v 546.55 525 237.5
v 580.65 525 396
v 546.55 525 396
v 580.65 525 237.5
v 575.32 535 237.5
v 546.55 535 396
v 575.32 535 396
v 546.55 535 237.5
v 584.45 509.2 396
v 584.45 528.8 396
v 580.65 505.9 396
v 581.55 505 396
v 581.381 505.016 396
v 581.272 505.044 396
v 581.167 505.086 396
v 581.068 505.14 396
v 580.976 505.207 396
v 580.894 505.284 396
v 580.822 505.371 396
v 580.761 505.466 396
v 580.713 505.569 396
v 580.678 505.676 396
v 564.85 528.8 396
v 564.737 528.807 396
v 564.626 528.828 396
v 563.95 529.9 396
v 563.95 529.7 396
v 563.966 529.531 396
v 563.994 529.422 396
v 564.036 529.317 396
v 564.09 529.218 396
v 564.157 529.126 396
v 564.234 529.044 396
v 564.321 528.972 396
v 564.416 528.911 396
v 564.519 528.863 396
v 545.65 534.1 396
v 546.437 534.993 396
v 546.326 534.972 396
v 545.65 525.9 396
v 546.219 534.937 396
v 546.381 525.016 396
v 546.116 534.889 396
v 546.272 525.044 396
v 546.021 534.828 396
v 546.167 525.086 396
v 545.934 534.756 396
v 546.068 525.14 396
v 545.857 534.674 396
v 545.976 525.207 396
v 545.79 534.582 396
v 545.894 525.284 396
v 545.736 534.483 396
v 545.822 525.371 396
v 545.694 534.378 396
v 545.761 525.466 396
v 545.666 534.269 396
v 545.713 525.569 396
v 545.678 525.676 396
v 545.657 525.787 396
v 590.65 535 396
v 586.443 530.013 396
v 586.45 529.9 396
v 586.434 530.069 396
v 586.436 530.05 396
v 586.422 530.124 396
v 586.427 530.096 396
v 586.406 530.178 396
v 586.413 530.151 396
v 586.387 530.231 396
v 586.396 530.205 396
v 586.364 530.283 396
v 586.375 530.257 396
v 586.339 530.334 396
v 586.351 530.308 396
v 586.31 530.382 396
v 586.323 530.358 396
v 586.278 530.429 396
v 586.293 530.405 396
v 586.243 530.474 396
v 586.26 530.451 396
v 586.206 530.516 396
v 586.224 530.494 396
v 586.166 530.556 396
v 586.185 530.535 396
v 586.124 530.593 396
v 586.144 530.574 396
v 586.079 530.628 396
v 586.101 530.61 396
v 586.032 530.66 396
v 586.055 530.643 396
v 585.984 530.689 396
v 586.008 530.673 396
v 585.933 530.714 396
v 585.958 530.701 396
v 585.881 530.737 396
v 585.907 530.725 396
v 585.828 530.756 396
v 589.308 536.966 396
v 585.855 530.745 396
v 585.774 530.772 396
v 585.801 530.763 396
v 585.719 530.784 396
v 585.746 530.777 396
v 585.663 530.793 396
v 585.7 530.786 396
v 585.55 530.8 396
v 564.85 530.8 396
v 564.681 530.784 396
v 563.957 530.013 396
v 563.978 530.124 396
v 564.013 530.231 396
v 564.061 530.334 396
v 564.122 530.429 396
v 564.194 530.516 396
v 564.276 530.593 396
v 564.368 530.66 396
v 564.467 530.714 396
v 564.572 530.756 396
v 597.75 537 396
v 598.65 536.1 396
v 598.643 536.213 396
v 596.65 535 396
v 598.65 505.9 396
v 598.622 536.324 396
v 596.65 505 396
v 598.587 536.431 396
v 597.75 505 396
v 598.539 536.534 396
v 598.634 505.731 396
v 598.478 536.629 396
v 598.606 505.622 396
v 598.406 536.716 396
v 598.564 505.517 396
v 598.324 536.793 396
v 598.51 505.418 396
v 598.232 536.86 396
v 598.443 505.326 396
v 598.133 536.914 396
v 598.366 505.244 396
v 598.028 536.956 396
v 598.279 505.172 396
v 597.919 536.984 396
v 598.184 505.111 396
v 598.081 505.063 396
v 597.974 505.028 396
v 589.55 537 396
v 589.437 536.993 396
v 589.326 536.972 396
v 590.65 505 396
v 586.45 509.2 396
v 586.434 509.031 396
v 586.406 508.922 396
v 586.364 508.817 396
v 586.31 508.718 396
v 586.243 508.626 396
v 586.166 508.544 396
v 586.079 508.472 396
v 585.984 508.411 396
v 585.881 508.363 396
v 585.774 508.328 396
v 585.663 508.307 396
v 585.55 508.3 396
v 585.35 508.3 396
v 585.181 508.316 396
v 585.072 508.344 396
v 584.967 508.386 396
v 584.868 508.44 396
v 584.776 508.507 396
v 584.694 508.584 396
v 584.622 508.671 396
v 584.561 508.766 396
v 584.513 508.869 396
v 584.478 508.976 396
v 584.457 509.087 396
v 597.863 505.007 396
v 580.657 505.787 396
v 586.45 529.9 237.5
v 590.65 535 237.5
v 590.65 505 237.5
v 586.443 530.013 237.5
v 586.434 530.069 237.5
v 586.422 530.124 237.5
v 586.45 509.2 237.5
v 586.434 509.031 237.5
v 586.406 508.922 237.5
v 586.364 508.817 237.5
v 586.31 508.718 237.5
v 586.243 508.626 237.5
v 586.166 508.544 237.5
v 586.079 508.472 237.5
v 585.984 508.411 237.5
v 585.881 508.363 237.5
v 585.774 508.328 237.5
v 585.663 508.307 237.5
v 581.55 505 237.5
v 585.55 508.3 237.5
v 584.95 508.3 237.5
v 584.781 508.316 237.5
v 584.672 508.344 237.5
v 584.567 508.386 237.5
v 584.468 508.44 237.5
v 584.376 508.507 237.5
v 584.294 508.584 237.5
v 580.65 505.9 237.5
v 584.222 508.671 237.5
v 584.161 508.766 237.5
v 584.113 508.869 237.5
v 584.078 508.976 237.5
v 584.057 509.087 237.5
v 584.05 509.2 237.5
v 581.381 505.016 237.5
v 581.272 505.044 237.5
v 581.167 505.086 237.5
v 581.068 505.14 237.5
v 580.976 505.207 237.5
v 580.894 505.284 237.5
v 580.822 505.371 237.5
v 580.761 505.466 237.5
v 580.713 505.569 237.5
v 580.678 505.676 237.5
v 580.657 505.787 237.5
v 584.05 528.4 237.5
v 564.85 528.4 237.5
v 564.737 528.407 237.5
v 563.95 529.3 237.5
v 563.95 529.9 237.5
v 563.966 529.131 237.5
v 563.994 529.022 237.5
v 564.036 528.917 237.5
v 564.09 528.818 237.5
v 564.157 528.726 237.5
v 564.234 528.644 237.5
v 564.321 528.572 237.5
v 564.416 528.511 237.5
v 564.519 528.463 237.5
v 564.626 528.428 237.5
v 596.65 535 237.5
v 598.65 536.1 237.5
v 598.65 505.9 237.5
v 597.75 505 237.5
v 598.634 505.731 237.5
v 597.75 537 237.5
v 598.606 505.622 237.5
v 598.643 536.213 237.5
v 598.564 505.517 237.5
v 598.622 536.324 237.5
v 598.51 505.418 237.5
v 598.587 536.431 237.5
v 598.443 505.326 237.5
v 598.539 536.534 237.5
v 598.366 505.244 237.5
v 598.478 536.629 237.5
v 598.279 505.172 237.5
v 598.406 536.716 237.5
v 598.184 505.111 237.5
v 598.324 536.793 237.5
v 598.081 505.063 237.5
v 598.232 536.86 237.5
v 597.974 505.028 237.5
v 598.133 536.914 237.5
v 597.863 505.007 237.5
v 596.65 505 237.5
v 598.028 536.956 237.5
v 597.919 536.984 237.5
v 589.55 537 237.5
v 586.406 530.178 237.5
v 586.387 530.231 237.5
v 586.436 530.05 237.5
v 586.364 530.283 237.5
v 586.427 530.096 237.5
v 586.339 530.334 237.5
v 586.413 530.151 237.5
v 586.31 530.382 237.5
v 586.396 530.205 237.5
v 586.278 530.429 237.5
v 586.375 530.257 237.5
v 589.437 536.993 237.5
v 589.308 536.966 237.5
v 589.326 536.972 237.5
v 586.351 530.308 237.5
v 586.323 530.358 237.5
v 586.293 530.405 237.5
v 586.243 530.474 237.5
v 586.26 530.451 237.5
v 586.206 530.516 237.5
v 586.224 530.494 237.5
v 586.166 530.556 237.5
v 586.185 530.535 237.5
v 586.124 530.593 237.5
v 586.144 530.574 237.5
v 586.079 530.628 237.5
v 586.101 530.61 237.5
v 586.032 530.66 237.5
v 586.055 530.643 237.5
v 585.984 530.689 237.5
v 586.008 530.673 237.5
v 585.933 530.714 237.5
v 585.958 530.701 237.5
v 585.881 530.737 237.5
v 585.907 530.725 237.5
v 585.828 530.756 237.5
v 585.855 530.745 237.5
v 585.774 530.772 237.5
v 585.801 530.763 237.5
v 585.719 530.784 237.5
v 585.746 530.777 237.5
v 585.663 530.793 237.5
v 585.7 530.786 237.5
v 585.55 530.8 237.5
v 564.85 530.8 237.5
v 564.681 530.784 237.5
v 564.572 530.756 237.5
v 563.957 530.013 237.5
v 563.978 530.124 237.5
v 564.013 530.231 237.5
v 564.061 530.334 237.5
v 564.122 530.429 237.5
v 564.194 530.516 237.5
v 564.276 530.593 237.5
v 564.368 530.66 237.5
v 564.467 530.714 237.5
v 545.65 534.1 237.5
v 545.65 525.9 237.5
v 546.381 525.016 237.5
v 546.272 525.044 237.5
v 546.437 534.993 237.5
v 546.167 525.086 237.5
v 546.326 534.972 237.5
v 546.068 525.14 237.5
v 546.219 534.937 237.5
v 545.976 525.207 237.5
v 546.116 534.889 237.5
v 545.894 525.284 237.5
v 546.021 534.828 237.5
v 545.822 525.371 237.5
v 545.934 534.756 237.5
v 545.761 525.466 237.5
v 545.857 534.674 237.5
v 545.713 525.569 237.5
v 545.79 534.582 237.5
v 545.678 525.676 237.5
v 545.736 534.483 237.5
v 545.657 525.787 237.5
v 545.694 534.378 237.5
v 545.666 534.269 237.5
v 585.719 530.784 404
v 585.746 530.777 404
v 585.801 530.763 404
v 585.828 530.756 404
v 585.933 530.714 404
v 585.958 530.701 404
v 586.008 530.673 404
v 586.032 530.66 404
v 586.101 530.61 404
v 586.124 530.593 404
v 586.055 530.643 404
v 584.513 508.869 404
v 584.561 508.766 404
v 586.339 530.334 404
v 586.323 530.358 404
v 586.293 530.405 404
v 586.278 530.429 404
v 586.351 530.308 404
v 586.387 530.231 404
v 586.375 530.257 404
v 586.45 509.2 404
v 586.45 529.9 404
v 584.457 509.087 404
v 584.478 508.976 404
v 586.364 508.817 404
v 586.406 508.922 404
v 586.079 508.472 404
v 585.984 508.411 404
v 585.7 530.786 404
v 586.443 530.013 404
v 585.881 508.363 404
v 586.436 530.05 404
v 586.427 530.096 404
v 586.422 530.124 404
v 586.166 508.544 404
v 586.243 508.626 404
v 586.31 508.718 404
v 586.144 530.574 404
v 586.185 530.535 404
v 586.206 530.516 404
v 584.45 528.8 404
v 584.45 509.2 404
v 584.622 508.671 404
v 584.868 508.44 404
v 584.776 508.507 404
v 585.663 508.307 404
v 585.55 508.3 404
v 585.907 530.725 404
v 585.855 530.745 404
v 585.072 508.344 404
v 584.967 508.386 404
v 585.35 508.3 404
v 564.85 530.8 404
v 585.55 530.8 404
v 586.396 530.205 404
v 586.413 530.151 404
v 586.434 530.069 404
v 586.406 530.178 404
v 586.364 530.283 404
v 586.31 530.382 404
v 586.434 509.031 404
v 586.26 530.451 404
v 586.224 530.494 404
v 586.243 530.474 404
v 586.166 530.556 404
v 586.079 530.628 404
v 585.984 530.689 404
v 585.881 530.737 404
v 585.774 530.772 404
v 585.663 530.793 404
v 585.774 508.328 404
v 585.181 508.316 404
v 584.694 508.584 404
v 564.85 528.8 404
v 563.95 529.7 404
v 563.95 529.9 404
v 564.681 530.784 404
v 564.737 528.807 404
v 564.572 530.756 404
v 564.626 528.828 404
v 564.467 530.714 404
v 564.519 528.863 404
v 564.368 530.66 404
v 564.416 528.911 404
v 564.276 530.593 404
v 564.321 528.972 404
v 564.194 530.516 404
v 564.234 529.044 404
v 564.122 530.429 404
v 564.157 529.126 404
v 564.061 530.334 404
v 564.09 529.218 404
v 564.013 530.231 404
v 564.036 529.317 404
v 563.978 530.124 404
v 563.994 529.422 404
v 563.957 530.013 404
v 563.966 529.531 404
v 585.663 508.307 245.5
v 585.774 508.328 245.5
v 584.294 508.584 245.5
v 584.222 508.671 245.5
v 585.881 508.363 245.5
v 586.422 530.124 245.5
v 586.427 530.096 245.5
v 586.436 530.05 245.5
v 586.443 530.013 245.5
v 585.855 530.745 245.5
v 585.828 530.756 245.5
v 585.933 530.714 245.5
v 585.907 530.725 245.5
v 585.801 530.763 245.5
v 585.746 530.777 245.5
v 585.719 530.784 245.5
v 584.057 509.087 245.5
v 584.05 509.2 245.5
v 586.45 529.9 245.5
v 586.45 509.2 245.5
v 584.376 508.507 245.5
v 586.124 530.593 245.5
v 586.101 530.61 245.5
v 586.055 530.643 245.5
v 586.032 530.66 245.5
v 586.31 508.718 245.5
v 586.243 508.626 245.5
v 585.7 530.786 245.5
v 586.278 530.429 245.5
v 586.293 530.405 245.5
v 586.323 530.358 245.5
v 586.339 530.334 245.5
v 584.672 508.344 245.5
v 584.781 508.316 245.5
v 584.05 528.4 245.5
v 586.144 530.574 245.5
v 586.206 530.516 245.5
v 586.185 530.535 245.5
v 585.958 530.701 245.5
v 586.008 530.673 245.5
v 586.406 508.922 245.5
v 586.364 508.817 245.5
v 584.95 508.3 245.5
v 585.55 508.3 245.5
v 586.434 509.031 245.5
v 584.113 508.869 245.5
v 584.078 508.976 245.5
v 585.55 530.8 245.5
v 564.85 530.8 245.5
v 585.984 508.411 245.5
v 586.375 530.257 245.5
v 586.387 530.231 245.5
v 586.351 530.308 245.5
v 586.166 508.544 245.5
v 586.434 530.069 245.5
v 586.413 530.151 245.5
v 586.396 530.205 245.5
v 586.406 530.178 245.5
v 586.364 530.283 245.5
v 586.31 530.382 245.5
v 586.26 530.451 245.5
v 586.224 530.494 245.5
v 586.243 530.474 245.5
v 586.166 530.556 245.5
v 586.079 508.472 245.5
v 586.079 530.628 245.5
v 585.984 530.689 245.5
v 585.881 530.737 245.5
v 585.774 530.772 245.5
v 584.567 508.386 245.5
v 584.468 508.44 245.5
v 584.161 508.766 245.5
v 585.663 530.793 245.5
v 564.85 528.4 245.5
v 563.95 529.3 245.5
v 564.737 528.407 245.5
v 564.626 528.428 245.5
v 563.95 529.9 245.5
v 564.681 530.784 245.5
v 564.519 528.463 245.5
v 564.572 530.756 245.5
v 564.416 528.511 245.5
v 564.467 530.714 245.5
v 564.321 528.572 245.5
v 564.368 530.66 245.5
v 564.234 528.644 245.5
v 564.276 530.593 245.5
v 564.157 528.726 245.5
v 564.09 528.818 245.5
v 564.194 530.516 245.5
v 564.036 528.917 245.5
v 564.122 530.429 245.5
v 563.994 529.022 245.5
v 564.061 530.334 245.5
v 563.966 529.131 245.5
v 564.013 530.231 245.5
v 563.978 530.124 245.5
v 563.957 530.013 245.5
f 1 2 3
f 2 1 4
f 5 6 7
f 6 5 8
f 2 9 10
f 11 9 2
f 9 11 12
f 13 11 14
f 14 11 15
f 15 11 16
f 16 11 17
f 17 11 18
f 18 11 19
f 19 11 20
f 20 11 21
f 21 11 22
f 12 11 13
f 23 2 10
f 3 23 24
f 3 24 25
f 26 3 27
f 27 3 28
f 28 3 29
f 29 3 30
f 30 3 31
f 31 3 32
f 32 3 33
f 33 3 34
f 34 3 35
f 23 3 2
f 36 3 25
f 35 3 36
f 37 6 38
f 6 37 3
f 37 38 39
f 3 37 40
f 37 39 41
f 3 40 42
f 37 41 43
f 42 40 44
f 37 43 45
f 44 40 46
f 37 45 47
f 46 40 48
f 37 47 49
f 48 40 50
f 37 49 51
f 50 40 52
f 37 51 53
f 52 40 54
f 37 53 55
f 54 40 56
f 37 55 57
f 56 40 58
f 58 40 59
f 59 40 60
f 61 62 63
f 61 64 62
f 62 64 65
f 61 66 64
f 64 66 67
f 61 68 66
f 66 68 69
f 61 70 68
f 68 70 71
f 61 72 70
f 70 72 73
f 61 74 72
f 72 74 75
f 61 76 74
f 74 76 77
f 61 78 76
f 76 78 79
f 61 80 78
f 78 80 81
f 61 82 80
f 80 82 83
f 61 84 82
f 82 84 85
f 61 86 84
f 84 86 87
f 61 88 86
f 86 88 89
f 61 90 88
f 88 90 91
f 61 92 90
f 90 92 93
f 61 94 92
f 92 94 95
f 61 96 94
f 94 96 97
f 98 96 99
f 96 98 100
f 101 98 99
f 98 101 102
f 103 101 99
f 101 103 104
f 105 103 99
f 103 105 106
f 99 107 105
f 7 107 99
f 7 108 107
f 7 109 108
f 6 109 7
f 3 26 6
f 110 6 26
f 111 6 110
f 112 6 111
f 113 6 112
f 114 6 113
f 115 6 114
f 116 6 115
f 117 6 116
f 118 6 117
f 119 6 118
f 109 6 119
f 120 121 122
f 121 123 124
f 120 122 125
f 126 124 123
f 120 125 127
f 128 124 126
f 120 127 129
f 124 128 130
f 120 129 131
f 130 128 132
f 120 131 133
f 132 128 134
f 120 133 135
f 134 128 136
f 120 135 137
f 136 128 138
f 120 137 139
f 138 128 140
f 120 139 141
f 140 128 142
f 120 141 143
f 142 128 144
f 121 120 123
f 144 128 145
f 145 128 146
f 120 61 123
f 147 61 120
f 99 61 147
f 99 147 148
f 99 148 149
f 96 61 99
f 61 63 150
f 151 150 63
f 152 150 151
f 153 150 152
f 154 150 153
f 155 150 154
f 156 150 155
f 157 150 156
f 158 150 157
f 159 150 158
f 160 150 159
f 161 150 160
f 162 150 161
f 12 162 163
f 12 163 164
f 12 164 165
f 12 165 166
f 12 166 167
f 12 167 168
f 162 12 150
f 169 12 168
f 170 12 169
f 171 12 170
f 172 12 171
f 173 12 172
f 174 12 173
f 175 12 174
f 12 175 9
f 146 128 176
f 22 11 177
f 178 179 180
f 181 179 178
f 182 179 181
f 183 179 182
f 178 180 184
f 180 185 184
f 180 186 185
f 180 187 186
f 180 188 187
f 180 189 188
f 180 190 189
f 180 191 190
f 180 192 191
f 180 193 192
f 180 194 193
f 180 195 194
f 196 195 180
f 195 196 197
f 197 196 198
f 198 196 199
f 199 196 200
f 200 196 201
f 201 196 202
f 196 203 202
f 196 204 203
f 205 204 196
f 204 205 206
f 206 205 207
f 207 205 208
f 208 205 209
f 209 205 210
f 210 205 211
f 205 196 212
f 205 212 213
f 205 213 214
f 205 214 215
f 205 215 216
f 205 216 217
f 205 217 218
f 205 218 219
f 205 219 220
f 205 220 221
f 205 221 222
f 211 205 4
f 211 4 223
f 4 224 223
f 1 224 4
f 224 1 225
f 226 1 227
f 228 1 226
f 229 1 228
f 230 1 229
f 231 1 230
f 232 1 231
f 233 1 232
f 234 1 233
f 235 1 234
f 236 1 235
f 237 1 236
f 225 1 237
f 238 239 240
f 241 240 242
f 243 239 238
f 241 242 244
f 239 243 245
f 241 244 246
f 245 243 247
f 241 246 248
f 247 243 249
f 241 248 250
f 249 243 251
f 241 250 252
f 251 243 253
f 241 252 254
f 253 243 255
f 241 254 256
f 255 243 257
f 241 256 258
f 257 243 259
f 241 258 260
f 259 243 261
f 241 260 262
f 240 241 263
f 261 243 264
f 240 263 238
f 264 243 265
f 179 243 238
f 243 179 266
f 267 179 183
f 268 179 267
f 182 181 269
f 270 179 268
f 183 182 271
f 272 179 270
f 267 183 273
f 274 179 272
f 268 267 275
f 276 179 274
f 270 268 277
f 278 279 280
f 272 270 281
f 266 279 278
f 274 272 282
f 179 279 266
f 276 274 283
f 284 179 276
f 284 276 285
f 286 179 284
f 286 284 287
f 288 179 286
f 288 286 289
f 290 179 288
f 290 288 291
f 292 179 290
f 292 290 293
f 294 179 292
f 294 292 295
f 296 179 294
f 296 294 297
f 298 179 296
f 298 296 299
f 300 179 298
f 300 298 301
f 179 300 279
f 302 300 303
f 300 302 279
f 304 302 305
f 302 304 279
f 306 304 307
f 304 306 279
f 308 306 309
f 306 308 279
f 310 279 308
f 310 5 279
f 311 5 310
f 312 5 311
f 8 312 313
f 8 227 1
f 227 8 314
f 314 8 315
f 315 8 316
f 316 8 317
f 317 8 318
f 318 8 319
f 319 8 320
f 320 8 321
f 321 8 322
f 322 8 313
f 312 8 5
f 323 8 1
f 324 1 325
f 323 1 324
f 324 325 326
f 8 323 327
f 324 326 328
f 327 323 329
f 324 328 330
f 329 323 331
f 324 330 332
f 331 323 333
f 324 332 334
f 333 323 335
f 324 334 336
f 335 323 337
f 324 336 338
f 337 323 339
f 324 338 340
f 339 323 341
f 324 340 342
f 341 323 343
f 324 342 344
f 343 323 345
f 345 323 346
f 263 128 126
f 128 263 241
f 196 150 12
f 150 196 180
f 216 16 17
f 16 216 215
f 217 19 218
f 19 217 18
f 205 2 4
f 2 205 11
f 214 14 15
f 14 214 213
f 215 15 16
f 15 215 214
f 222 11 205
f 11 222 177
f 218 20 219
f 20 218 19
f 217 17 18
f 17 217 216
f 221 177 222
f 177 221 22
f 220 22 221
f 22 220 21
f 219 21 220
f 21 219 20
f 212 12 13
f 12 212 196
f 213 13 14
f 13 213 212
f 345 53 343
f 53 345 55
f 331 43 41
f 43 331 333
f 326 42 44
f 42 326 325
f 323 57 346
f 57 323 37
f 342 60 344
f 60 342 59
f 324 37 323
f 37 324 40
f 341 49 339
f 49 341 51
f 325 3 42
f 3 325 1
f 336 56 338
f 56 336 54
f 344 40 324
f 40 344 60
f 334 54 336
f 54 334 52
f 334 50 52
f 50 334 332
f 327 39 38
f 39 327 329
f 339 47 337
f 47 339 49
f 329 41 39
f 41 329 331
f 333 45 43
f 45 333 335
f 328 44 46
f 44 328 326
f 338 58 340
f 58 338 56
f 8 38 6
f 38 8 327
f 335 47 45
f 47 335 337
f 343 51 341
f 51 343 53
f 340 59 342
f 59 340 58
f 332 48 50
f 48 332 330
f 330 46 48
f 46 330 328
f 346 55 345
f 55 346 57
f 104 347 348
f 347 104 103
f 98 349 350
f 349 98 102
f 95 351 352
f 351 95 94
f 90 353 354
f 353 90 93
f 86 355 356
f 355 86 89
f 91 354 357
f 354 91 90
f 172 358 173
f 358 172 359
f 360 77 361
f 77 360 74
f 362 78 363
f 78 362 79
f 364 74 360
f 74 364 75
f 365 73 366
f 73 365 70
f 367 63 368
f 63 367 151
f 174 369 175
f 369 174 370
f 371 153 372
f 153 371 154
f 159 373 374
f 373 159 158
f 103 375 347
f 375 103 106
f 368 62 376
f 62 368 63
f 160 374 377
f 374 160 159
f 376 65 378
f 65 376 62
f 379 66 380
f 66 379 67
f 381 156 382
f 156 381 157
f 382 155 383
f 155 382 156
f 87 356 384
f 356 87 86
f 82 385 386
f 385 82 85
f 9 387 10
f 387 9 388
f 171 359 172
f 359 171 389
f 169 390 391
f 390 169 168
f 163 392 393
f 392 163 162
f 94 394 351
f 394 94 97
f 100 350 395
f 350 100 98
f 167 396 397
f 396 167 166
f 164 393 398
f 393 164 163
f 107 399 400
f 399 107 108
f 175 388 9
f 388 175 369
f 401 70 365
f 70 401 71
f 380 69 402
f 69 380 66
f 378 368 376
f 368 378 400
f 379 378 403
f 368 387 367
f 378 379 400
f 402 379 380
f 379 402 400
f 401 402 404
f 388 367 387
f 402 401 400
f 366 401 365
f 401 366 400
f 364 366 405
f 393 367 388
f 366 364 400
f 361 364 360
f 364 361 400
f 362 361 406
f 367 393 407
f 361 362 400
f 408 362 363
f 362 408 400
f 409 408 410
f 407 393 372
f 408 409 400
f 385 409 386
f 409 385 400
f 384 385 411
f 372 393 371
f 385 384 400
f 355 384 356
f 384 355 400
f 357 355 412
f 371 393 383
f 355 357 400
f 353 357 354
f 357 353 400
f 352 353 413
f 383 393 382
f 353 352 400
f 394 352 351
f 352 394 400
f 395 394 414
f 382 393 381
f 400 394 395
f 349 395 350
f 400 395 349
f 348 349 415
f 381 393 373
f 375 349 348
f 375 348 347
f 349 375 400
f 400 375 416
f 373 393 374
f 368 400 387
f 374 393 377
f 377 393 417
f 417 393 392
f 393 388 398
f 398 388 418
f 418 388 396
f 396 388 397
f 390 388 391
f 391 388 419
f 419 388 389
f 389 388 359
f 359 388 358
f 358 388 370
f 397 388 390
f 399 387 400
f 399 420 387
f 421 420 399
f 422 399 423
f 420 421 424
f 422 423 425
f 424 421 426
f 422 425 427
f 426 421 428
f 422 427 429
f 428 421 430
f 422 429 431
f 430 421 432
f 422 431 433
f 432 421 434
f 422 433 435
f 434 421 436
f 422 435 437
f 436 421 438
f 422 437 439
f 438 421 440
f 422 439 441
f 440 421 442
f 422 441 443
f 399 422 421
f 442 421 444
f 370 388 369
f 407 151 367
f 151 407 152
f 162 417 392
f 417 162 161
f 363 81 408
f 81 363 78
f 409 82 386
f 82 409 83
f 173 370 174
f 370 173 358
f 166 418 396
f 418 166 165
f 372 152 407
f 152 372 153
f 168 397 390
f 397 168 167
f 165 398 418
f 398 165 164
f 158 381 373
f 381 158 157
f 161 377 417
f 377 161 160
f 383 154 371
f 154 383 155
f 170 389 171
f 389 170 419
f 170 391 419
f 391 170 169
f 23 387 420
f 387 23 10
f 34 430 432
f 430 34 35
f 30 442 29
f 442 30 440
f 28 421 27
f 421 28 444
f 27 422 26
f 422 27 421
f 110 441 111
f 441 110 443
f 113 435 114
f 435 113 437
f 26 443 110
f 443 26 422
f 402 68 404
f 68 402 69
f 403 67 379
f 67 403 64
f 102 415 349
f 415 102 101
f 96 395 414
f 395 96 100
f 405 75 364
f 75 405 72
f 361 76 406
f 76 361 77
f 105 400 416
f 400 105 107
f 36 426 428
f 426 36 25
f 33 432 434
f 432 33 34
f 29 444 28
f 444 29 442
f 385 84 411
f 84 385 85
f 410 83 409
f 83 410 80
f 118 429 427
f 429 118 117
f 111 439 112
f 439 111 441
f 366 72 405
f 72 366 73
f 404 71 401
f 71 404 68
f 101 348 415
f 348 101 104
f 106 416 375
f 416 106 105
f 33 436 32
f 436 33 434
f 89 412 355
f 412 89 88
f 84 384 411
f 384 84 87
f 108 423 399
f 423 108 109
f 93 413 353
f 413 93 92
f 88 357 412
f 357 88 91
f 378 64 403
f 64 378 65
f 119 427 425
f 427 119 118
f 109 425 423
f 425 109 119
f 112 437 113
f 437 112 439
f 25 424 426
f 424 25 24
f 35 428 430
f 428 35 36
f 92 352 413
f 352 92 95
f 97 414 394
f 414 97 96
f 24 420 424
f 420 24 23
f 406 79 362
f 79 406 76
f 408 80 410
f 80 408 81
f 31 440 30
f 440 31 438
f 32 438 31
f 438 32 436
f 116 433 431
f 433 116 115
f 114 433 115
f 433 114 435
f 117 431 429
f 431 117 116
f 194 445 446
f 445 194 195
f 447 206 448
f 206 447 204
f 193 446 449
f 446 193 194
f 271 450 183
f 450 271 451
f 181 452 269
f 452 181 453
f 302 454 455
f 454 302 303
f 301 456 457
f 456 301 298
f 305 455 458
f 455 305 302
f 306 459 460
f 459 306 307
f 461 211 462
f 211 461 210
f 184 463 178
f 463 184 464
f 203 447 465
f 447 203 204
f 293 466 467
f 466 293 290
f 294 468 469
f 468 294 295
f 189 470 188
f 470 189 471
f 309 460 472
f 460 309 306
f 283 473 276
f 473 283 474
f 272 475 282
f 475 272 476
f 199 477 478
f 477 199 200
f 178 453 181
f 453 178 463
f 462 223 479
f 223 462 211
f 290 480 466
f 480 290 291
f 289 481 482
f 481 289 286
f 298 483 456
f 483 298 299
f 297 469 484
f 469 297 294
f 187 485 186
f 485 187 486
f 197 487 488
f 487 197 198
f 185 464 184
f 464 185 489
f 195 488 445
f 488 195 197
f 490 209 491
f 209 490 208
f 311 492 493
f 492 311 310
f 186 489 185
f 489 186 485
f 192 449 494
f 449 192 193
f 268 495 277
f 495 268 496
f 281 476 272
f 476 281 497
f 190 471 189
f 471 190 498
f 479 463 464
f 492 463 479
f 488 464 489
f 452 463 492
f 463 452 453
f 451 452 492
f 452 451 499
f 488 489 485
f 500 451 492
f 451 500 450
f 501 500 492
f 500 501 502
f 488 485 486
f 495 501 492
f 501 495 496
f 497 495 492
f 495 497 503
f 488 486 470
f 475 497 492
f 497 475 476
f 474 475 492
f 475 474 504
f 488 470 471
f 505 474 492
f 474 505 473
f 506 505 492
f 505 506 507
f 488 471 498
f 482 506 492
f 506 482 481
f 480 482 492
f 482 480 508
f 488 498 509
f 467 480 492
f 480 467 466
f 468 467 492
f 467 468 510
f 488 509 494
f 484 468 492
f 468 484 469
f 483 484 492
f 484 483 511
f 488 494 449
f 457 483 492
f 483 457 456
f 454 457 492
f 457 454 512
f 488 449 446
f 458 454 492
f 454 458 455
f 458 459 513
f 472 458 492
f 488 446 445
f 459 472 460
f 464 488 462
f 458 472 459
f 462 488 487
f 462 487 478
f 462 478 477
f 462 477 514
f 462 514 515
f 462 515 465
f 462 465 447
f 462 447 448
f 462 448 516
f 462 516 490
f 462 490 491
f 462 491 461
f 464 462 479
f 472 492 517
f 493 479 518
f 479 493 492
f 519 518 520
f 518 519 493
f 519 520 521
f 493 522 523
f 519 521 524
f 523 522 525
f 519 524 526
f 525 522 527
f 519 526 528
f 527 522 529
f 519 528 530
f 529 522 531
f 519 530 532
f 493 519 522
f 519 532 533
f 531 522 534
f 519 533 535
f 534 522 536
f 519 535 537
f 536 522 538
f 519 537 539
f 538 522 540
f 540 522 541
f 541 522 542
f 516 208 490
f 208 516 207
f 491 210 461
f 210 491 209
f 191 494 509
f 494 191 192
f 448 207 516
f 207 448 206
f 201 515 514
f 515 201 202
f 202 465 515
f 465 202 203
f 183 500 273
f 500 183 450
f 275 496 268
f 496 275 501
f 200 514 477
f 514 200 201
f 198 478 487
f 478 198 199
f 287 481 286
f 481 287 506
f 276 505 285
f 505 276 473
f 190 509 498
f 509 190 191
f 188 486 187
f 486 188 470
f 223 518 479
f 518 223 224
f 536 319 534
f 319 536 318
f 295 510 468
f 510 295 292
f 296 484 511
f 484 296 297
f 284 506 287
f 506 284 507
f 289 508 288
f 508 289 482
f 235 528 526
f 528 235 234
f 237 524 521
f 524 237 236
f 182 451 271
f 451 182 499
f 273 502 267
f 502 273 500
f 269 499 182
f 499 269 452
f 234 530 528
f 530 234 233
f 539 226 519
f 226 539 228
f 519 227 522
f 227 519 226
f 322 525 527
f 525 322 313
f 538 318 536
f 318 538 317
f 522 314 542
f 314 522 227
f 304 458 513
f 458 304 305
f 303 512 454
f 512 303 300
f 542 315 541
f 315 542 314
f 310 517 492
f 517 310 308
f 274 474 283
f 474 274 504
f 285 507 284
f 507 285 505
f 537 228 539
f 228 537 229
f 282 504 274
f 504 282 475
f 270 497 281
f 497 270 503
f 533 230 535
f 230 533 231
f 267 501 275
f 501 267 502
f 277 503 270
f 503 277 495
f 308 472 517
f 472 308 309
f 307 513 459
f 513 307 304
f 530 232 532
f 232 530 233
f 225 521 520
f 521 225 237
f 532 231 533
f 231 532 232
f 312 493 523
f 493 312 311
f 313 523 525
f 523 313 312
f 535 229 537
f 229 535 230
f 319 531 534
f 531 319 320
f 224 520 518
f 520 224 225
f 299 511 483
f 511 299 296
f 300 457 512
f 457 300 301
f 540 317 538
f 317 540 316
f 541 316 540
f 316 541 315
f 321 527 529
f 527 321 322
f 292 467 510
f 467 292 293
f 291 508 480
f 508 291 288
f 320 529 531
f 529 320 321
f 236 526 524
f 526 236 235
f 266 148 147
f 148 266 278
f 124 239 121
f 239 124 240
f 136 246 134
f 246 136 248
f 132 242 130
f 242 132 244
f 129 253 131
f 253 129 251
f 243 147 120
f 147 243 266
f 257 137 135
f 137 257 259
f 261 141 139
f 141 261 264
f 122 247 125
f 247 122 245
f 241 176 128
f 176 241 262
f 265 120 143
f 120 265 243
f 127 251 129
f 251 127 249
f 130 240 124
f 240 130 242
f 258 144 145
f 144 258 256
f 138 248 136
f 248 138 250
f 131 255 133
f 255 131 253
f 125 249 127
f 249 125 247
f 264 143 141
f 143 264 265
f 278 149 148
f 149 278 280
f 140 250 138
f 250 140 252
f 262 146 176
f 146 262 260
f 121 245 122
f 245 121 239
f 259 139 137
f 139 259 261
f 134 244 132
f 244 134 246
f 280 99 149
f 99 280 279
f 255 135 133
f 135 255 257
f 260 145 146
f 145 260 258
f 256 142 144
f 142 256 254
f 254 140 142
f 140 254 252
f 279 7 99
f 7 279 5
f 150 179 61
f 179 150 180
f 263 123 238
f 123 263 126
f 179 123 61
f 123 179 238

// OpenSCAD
// file: construction.scad
/*
Specialized construction functions specifically for the enclosure.
By combining these operators the various instances of enclosure pieces 
can be constructed.
*/
include <parameters.scad>;
use <utility.scad>;

module lug() {
    ra = knob_diameter/2;
    rb = lug_diameter/2;
    rotate([0,90,90]) 
        rotate_extrude()
            color("DarkSeaGreen")
            polygon([[0,0],[0,lug_height],[rb,lug_height],
                [rb,2.5],[ra,1],[ra,0]]);
}

// extend the corner frame to be symmetrical with the front corner
module extend_frame_x(height=frame_corner_height) {
    union() {
        children();
        color("SteelBlue")
        translate([hinge_inner_diameter*2, hinge_inner_diameter,0]) 
            rotate([0,0,-90])
                frame( hinge_inner_diameter*3+1, 
                    height, hinge_inner_diameter, 
                    corner_roundness );
    }
}

module frame( width, height, thickness, roundness ) {
        linear_extrude(height=height)
            apply_roundness(roundness, $fs =0.01) 
                    square( [thickness, width] );
}

module frame_corner( width, height, thickness, roundness ) {    
    union() {
        mirror([0,1,0]) 
            rotate([0,0,-90])
                frame( width, height, thickness, roundness );
        frame( width, height, thickness + panel_thickness, roundness );
    }   
}

module frame_connector_corner(clearance=0) {
    translate([panel_thickness*1.7,panel_thickness*0.70, 0]) 
        cornerize()
            frame( frame_corner_width*0.75, frame_connector_depth, 
                frame_thickness*.20+clearance, corner_roundness );
        
}

module add_lugs() {   
    union() {
        children();
        translate([lug_offset_x,-lug_height,lug_offset_z]) 
            lug();
        translate([lug_offset_x,-lug_height, lug_offset_z+lug_offset_gap])
            lug(); 
    } 
}

module add_connector(height=frame_corner_height) {
    union() {
        children();

        color("SteelBlue")
        translate([0,0,height])
            frame_connector_corner();
    }
}

module add_hinge_post( top=false ) {
    union() {
        difference() {
            children();

            // create a negative space that snuggly fits the hinge
            translate([frame_corner_width+plastic_thickness+hinge_gap,
                hinge_inner_diameter/2, (top?frame_corner_height:0)])
                mirror(top?[0,0,1]:[0,0,0])
                    union() {
                         height = hinge_height-hinge_inner_diameter;
                        translate([0,0,height/2]) 
                            cube([hinge_inner_diameter+2,
                                hinge_inner_diameter+2,height+1.3],true);
                        // hinge open
                        rotate([0,0,-90]) translate([0,0,-0.1]) scale(1.05) hinge();
                        // hinge closed
                        rotate([0,0,0]) translate([0,0,-0.1]) scale(1.05) hinge();
                    }
            
        }
        color("SteelBlue")
        translate([frame_corner_width+plastic_thickness+hinge_gap,hinge_inner_diameter/2,0])
            cylinder(d=hinge_inner_diameter, frame_corner_height);
    }
}

module add_outside_frame( height ) {
    union() {
        children();
        translate([-plastic_thickness,-plastic_thickness,0])
            color("SteelBlue")
            frame( frame_corner_width+plastic_thickness, height, frame_thickness,
                corner_roundness);
        translate([14.5,0.05,height/2])
            color("SteelBlue")
            rotate([0,0,8])
            cube([frame_corner_width/2,plastic_thickness,height],true);
    }
}

module hinge() {
    height = hinge_height-hinge_inner_diameter;
    width = hinge_inner_diameter+hinge_ring_thickness;
    difference() {
        
        // create the base shape for the hinge
        union() {    
            cylinder(d=width, height);
            
            translate([hinge_inner_diameter*3+hinge_clearance,
                -hinge_offset,height/2-plastic_thickness/2]) 
                cube([hinge_length,hinge_thickness,
                    height+plastic_thickness],true);
           
            translate([2.52,-5.2,height/2]) 
                rotate([0,0,40]) 
                    cube([hinge_inner_diameter,
                        width+1,height],true);
        }
        
        // remove a hole for the hinge post to slide into
        cylinder(d=hinge_inner_diameter+tolerance_smooth, height+1);
        
        // trim the left corner
        translate([4,-17.5,height/2-1]) 
            rotate([0,0,145]) 
                cube([50,width-2,height+3],true);
        
        // smooth the tranistion to the bottom edge
        translate([32,-10,height/2-18.25]) 
            rotate([-88.5,0.1,96]) 
                cube([40,20,60],true);
        
        // add a chamfer to right corner
        translate([hinge_length+8,0,height+25]) 
            rotate([0,45,0]) 
            cube(50,true);
    }   
}

module add_connector_slot() {
    difference() {
        children();
        frame_connector_corner(tolerance_tight);
    }
}

module frame_vertical() {
    add_connector_slot()
    add_connector(frame_vertical_height)
    extend_frame_x(frame_vertical_height)
        frame_corner( frame_corner_width, 
            frame_vertical_height, frame_thickness, 
            corner_roundness );          
}

module grip() {
    rotate([90,90,90])
        color("DarkSeaGreen")
        frame(plastic_thickness,plastic_thickness,plastic_thickness,corner_roundness);
}

module add_snap_lock_slot(top=false) {
    difference() {
        children();
        translate([0,0,top?frame_corner_height+shelf_height:-shelf_height])
            mirror(top?[0,0,1]:[0,0,0])
                 snaplock(tolerance_tight,top);
    }
}

module lug2(clearance) {
    color("DarkSeaGreen")
    rotate([90,0,0])
            frame(frame_connector_depth+clearance,snaplock_connector_size/2,
                connector_thickness+clearance,corner_roundness);
}

module snaplock(clearance=0,top=false) {
    height = shelf_height+snaplock_connector_size+plastic_thickness+clearance;
    union() {
        color("Magenta")
        difference() {
            translate([snaplock_size,-snaplock_thickness*3,-plastic_thickness])
                rotate([0,0,90])
                    frame(snaplock_size+clearance,height,
                        snaplock_width*2+plastic_thickness, corner_roundness);
            fix_preview2() cube([snaplock_size*1.1,snaplock_width+plastic_thickness,shelf_height]);
        }

        // grips at top
        translate([5,1,shelf_height+1.5]) grip();
        translate([18,1,shelf_height+1.5]) grip();

        // grips at bottom
        translate([5,1,0.5]) grip();
        translate([18,1,0.5]) grip();

        // connector lugs
        translate([3*snaplock_size/4-connector_thickness/2-clearance/2,
            frame_connector_depth+snaplock_thickness,
            shelf_height+snaplock_connector_size/2 - (snaplock_connector_size/4)-clearance/2])
            lug2(clearance);

        translate([(top?2:1)*snaplock_size/4-connector_thickness/2-clearance/2,
            frame_connector_depth+snaplock_thickness,
            shelf_height+snaplock_connector_size/2 - (snaplock_connector_size/4)-clearance/2])
            lug2(clearance);
    }
}
// file: support.scad
/*
Provides support objects that are used to model the environment of the enclosure
to ensure the pieces slot together and fit properly.
*/
include <parameters.scad>;
use <utility.scad>;

module wall_panel() {
    cube([panel_height,panel_width,panel_thickness]);
}

module door_panel() {
     cube([door_panel_width,door_panel_height,door_panel_thickness]);
}

module left_wall_panel() {
    translate([panel_thickness,0,panel_offset_z]) 
        rotate([0,-90,0]) 
            wall_panel();
}

module back_wall_panel() {
    translate([(enclosure_width-panel_width)/2,
            enclosure_depth-panel_thickness-plastic_thickness,
            0]) 
        rotate([-90,-90,0]) 
            wall_panel();
}

module right_wall_panel() {
    translate([enclosure_width,0,panel_offset_z]) 
        rotate([0,-90,0]) 
            wall_panel();
}

module left_door(open=false) {
    translate([frame_corner_width+plastic_thickness+hinge_gap,
            hinge_inner_diameter/2,0]) 
        rotate([90,0,open?-90:0]) 
            translate([door_hinge_offset,0,hinge_offset-
                    door_panel_thickness/2])
                door_panel();
}

module right_door(open=false) {
    translate([enclosure_width,0,0])  
        mirror([1,0,0]) left_door(open);
}
// file: utility.scad
/*
Generically useful utility functions.
*/

// applies roundness without altering dimensions of object
module apply_roundness(r)
    offset(r) offset(delta=-r) children(0);

// makes a corner piece by mirroring and rotating one side
module cornerize() {
    union() {
        children(0);
        mirror([0,1,0]) 
            rotate([0,0,-90])
                children(0);
    }
} 

module explode(vector) {
    for(i=[0:$children-1])
        translate(vector*i)
            children(i);

}

/*
 The fix_preview series of functions are used to make small
 translations in order to reduce conincident plane artifacts
 from the preview mode. 

 It would be nice to have just one module for this but I haven't
 figured out a way of doing this generically - so the following
 uses a small translation in different directions depending on
 the use case needed.
*/
module fix_preview() {
    translate($preview?[-0.001,-0.001,-0.001]:[0,0,0])
        children(0);
}

module fix_preview2() {
    translate($preview?[-0.001,0.001,-0.001]:[0,0,0])
        children(0);
}

module fix_preview3() {
    translate($preview?[-0.001,0.001,0.001]:[0,0,0])
        children(0);
}
// file: parameters.scad
$fn=50;

// Wall thickness and tolerance
plastic_thickness=2.0;
tolerance_smooth=0.45;
tolerance_tight=0.40;
corner_roundness=0.9;

// Specify enclosure dimensions
enclosure_height=475.0;
enclosure_depth=535.0;

// Wall panel dimensions
panel_thickness=6.0;
panel_height=450.0;
panel_width=535.0;
panel_offset_z = enclosure_height - panel_height;

// Door panel dimensions
door_panel_thickness=3.0;
door_panel_width=250.0;
door_panel_height=475.0;
door_hinge_offset=6.5;

// Frame
frame_corner_width=30.0;
frame_corner_height=79.0;
frame_thickness = plastic_thickness*2 + panel_thickness;
frame_side = (enclosure_height - frame_corner_height*2)/2;
frame_clip_height=50.5;
frame_vertical_height = (enclosure_height-frame_corner_height*2)/2;
frame_connector_depth = 8.0;

// Lug
knob_diameter=9.8;
lug_diameter=6.2;
lug_gap=1.4;
lug_height = lug_gap+2.15;
lug_offset_x=15.0;
lug_offset_z=27.0;
lug_offset_gap=32;

// Snaplock
shelf_height=50.3+tolerance_tight;
snaplock_width=5+tolerance_tight;
snaplock_size=25;
snaplock_thickness=plastic_thickness;
snaplock_connector_size=15;
connector_thickness=frame_thickness*.4;

// Door hinge
hinge_inner_diameter=10;
hinge_height=25;
hinge_length=53;
hinge_gap = 9.6;
hinge_clearance = 1.5;
hinge_ring_thickness=3.0;
hinge_thickness=plastic_thickness*2 + door_panel_thickness;
hinge_offset=6.5+plastic_thickness;

enclosure_width=2*(frame_corner_width+plastic_thickness+hinge_gap
    +door_hinge_offset) + door_panel_width*2 +tolerance_smooth;
// main file
include <parameters.scad>
use <utility.scad>
use <support.scad>
use <construction.scad>

module back_right_vertical_b() {
    difference() {
        translate([enclosure_width,enclosure_depth,frame_corner_height+frame_vertical_height])
            mirror([0,1,0])
            mirror([1,0,0])
                add_outside_frame(frame_vertical_height) 
                    color("SteelBlue")
                    frame_vertical();
        fix_preview() right_wall_panel();
    }
}

%fix_preview() right_wall_panel();
back_right_vertical_b();
